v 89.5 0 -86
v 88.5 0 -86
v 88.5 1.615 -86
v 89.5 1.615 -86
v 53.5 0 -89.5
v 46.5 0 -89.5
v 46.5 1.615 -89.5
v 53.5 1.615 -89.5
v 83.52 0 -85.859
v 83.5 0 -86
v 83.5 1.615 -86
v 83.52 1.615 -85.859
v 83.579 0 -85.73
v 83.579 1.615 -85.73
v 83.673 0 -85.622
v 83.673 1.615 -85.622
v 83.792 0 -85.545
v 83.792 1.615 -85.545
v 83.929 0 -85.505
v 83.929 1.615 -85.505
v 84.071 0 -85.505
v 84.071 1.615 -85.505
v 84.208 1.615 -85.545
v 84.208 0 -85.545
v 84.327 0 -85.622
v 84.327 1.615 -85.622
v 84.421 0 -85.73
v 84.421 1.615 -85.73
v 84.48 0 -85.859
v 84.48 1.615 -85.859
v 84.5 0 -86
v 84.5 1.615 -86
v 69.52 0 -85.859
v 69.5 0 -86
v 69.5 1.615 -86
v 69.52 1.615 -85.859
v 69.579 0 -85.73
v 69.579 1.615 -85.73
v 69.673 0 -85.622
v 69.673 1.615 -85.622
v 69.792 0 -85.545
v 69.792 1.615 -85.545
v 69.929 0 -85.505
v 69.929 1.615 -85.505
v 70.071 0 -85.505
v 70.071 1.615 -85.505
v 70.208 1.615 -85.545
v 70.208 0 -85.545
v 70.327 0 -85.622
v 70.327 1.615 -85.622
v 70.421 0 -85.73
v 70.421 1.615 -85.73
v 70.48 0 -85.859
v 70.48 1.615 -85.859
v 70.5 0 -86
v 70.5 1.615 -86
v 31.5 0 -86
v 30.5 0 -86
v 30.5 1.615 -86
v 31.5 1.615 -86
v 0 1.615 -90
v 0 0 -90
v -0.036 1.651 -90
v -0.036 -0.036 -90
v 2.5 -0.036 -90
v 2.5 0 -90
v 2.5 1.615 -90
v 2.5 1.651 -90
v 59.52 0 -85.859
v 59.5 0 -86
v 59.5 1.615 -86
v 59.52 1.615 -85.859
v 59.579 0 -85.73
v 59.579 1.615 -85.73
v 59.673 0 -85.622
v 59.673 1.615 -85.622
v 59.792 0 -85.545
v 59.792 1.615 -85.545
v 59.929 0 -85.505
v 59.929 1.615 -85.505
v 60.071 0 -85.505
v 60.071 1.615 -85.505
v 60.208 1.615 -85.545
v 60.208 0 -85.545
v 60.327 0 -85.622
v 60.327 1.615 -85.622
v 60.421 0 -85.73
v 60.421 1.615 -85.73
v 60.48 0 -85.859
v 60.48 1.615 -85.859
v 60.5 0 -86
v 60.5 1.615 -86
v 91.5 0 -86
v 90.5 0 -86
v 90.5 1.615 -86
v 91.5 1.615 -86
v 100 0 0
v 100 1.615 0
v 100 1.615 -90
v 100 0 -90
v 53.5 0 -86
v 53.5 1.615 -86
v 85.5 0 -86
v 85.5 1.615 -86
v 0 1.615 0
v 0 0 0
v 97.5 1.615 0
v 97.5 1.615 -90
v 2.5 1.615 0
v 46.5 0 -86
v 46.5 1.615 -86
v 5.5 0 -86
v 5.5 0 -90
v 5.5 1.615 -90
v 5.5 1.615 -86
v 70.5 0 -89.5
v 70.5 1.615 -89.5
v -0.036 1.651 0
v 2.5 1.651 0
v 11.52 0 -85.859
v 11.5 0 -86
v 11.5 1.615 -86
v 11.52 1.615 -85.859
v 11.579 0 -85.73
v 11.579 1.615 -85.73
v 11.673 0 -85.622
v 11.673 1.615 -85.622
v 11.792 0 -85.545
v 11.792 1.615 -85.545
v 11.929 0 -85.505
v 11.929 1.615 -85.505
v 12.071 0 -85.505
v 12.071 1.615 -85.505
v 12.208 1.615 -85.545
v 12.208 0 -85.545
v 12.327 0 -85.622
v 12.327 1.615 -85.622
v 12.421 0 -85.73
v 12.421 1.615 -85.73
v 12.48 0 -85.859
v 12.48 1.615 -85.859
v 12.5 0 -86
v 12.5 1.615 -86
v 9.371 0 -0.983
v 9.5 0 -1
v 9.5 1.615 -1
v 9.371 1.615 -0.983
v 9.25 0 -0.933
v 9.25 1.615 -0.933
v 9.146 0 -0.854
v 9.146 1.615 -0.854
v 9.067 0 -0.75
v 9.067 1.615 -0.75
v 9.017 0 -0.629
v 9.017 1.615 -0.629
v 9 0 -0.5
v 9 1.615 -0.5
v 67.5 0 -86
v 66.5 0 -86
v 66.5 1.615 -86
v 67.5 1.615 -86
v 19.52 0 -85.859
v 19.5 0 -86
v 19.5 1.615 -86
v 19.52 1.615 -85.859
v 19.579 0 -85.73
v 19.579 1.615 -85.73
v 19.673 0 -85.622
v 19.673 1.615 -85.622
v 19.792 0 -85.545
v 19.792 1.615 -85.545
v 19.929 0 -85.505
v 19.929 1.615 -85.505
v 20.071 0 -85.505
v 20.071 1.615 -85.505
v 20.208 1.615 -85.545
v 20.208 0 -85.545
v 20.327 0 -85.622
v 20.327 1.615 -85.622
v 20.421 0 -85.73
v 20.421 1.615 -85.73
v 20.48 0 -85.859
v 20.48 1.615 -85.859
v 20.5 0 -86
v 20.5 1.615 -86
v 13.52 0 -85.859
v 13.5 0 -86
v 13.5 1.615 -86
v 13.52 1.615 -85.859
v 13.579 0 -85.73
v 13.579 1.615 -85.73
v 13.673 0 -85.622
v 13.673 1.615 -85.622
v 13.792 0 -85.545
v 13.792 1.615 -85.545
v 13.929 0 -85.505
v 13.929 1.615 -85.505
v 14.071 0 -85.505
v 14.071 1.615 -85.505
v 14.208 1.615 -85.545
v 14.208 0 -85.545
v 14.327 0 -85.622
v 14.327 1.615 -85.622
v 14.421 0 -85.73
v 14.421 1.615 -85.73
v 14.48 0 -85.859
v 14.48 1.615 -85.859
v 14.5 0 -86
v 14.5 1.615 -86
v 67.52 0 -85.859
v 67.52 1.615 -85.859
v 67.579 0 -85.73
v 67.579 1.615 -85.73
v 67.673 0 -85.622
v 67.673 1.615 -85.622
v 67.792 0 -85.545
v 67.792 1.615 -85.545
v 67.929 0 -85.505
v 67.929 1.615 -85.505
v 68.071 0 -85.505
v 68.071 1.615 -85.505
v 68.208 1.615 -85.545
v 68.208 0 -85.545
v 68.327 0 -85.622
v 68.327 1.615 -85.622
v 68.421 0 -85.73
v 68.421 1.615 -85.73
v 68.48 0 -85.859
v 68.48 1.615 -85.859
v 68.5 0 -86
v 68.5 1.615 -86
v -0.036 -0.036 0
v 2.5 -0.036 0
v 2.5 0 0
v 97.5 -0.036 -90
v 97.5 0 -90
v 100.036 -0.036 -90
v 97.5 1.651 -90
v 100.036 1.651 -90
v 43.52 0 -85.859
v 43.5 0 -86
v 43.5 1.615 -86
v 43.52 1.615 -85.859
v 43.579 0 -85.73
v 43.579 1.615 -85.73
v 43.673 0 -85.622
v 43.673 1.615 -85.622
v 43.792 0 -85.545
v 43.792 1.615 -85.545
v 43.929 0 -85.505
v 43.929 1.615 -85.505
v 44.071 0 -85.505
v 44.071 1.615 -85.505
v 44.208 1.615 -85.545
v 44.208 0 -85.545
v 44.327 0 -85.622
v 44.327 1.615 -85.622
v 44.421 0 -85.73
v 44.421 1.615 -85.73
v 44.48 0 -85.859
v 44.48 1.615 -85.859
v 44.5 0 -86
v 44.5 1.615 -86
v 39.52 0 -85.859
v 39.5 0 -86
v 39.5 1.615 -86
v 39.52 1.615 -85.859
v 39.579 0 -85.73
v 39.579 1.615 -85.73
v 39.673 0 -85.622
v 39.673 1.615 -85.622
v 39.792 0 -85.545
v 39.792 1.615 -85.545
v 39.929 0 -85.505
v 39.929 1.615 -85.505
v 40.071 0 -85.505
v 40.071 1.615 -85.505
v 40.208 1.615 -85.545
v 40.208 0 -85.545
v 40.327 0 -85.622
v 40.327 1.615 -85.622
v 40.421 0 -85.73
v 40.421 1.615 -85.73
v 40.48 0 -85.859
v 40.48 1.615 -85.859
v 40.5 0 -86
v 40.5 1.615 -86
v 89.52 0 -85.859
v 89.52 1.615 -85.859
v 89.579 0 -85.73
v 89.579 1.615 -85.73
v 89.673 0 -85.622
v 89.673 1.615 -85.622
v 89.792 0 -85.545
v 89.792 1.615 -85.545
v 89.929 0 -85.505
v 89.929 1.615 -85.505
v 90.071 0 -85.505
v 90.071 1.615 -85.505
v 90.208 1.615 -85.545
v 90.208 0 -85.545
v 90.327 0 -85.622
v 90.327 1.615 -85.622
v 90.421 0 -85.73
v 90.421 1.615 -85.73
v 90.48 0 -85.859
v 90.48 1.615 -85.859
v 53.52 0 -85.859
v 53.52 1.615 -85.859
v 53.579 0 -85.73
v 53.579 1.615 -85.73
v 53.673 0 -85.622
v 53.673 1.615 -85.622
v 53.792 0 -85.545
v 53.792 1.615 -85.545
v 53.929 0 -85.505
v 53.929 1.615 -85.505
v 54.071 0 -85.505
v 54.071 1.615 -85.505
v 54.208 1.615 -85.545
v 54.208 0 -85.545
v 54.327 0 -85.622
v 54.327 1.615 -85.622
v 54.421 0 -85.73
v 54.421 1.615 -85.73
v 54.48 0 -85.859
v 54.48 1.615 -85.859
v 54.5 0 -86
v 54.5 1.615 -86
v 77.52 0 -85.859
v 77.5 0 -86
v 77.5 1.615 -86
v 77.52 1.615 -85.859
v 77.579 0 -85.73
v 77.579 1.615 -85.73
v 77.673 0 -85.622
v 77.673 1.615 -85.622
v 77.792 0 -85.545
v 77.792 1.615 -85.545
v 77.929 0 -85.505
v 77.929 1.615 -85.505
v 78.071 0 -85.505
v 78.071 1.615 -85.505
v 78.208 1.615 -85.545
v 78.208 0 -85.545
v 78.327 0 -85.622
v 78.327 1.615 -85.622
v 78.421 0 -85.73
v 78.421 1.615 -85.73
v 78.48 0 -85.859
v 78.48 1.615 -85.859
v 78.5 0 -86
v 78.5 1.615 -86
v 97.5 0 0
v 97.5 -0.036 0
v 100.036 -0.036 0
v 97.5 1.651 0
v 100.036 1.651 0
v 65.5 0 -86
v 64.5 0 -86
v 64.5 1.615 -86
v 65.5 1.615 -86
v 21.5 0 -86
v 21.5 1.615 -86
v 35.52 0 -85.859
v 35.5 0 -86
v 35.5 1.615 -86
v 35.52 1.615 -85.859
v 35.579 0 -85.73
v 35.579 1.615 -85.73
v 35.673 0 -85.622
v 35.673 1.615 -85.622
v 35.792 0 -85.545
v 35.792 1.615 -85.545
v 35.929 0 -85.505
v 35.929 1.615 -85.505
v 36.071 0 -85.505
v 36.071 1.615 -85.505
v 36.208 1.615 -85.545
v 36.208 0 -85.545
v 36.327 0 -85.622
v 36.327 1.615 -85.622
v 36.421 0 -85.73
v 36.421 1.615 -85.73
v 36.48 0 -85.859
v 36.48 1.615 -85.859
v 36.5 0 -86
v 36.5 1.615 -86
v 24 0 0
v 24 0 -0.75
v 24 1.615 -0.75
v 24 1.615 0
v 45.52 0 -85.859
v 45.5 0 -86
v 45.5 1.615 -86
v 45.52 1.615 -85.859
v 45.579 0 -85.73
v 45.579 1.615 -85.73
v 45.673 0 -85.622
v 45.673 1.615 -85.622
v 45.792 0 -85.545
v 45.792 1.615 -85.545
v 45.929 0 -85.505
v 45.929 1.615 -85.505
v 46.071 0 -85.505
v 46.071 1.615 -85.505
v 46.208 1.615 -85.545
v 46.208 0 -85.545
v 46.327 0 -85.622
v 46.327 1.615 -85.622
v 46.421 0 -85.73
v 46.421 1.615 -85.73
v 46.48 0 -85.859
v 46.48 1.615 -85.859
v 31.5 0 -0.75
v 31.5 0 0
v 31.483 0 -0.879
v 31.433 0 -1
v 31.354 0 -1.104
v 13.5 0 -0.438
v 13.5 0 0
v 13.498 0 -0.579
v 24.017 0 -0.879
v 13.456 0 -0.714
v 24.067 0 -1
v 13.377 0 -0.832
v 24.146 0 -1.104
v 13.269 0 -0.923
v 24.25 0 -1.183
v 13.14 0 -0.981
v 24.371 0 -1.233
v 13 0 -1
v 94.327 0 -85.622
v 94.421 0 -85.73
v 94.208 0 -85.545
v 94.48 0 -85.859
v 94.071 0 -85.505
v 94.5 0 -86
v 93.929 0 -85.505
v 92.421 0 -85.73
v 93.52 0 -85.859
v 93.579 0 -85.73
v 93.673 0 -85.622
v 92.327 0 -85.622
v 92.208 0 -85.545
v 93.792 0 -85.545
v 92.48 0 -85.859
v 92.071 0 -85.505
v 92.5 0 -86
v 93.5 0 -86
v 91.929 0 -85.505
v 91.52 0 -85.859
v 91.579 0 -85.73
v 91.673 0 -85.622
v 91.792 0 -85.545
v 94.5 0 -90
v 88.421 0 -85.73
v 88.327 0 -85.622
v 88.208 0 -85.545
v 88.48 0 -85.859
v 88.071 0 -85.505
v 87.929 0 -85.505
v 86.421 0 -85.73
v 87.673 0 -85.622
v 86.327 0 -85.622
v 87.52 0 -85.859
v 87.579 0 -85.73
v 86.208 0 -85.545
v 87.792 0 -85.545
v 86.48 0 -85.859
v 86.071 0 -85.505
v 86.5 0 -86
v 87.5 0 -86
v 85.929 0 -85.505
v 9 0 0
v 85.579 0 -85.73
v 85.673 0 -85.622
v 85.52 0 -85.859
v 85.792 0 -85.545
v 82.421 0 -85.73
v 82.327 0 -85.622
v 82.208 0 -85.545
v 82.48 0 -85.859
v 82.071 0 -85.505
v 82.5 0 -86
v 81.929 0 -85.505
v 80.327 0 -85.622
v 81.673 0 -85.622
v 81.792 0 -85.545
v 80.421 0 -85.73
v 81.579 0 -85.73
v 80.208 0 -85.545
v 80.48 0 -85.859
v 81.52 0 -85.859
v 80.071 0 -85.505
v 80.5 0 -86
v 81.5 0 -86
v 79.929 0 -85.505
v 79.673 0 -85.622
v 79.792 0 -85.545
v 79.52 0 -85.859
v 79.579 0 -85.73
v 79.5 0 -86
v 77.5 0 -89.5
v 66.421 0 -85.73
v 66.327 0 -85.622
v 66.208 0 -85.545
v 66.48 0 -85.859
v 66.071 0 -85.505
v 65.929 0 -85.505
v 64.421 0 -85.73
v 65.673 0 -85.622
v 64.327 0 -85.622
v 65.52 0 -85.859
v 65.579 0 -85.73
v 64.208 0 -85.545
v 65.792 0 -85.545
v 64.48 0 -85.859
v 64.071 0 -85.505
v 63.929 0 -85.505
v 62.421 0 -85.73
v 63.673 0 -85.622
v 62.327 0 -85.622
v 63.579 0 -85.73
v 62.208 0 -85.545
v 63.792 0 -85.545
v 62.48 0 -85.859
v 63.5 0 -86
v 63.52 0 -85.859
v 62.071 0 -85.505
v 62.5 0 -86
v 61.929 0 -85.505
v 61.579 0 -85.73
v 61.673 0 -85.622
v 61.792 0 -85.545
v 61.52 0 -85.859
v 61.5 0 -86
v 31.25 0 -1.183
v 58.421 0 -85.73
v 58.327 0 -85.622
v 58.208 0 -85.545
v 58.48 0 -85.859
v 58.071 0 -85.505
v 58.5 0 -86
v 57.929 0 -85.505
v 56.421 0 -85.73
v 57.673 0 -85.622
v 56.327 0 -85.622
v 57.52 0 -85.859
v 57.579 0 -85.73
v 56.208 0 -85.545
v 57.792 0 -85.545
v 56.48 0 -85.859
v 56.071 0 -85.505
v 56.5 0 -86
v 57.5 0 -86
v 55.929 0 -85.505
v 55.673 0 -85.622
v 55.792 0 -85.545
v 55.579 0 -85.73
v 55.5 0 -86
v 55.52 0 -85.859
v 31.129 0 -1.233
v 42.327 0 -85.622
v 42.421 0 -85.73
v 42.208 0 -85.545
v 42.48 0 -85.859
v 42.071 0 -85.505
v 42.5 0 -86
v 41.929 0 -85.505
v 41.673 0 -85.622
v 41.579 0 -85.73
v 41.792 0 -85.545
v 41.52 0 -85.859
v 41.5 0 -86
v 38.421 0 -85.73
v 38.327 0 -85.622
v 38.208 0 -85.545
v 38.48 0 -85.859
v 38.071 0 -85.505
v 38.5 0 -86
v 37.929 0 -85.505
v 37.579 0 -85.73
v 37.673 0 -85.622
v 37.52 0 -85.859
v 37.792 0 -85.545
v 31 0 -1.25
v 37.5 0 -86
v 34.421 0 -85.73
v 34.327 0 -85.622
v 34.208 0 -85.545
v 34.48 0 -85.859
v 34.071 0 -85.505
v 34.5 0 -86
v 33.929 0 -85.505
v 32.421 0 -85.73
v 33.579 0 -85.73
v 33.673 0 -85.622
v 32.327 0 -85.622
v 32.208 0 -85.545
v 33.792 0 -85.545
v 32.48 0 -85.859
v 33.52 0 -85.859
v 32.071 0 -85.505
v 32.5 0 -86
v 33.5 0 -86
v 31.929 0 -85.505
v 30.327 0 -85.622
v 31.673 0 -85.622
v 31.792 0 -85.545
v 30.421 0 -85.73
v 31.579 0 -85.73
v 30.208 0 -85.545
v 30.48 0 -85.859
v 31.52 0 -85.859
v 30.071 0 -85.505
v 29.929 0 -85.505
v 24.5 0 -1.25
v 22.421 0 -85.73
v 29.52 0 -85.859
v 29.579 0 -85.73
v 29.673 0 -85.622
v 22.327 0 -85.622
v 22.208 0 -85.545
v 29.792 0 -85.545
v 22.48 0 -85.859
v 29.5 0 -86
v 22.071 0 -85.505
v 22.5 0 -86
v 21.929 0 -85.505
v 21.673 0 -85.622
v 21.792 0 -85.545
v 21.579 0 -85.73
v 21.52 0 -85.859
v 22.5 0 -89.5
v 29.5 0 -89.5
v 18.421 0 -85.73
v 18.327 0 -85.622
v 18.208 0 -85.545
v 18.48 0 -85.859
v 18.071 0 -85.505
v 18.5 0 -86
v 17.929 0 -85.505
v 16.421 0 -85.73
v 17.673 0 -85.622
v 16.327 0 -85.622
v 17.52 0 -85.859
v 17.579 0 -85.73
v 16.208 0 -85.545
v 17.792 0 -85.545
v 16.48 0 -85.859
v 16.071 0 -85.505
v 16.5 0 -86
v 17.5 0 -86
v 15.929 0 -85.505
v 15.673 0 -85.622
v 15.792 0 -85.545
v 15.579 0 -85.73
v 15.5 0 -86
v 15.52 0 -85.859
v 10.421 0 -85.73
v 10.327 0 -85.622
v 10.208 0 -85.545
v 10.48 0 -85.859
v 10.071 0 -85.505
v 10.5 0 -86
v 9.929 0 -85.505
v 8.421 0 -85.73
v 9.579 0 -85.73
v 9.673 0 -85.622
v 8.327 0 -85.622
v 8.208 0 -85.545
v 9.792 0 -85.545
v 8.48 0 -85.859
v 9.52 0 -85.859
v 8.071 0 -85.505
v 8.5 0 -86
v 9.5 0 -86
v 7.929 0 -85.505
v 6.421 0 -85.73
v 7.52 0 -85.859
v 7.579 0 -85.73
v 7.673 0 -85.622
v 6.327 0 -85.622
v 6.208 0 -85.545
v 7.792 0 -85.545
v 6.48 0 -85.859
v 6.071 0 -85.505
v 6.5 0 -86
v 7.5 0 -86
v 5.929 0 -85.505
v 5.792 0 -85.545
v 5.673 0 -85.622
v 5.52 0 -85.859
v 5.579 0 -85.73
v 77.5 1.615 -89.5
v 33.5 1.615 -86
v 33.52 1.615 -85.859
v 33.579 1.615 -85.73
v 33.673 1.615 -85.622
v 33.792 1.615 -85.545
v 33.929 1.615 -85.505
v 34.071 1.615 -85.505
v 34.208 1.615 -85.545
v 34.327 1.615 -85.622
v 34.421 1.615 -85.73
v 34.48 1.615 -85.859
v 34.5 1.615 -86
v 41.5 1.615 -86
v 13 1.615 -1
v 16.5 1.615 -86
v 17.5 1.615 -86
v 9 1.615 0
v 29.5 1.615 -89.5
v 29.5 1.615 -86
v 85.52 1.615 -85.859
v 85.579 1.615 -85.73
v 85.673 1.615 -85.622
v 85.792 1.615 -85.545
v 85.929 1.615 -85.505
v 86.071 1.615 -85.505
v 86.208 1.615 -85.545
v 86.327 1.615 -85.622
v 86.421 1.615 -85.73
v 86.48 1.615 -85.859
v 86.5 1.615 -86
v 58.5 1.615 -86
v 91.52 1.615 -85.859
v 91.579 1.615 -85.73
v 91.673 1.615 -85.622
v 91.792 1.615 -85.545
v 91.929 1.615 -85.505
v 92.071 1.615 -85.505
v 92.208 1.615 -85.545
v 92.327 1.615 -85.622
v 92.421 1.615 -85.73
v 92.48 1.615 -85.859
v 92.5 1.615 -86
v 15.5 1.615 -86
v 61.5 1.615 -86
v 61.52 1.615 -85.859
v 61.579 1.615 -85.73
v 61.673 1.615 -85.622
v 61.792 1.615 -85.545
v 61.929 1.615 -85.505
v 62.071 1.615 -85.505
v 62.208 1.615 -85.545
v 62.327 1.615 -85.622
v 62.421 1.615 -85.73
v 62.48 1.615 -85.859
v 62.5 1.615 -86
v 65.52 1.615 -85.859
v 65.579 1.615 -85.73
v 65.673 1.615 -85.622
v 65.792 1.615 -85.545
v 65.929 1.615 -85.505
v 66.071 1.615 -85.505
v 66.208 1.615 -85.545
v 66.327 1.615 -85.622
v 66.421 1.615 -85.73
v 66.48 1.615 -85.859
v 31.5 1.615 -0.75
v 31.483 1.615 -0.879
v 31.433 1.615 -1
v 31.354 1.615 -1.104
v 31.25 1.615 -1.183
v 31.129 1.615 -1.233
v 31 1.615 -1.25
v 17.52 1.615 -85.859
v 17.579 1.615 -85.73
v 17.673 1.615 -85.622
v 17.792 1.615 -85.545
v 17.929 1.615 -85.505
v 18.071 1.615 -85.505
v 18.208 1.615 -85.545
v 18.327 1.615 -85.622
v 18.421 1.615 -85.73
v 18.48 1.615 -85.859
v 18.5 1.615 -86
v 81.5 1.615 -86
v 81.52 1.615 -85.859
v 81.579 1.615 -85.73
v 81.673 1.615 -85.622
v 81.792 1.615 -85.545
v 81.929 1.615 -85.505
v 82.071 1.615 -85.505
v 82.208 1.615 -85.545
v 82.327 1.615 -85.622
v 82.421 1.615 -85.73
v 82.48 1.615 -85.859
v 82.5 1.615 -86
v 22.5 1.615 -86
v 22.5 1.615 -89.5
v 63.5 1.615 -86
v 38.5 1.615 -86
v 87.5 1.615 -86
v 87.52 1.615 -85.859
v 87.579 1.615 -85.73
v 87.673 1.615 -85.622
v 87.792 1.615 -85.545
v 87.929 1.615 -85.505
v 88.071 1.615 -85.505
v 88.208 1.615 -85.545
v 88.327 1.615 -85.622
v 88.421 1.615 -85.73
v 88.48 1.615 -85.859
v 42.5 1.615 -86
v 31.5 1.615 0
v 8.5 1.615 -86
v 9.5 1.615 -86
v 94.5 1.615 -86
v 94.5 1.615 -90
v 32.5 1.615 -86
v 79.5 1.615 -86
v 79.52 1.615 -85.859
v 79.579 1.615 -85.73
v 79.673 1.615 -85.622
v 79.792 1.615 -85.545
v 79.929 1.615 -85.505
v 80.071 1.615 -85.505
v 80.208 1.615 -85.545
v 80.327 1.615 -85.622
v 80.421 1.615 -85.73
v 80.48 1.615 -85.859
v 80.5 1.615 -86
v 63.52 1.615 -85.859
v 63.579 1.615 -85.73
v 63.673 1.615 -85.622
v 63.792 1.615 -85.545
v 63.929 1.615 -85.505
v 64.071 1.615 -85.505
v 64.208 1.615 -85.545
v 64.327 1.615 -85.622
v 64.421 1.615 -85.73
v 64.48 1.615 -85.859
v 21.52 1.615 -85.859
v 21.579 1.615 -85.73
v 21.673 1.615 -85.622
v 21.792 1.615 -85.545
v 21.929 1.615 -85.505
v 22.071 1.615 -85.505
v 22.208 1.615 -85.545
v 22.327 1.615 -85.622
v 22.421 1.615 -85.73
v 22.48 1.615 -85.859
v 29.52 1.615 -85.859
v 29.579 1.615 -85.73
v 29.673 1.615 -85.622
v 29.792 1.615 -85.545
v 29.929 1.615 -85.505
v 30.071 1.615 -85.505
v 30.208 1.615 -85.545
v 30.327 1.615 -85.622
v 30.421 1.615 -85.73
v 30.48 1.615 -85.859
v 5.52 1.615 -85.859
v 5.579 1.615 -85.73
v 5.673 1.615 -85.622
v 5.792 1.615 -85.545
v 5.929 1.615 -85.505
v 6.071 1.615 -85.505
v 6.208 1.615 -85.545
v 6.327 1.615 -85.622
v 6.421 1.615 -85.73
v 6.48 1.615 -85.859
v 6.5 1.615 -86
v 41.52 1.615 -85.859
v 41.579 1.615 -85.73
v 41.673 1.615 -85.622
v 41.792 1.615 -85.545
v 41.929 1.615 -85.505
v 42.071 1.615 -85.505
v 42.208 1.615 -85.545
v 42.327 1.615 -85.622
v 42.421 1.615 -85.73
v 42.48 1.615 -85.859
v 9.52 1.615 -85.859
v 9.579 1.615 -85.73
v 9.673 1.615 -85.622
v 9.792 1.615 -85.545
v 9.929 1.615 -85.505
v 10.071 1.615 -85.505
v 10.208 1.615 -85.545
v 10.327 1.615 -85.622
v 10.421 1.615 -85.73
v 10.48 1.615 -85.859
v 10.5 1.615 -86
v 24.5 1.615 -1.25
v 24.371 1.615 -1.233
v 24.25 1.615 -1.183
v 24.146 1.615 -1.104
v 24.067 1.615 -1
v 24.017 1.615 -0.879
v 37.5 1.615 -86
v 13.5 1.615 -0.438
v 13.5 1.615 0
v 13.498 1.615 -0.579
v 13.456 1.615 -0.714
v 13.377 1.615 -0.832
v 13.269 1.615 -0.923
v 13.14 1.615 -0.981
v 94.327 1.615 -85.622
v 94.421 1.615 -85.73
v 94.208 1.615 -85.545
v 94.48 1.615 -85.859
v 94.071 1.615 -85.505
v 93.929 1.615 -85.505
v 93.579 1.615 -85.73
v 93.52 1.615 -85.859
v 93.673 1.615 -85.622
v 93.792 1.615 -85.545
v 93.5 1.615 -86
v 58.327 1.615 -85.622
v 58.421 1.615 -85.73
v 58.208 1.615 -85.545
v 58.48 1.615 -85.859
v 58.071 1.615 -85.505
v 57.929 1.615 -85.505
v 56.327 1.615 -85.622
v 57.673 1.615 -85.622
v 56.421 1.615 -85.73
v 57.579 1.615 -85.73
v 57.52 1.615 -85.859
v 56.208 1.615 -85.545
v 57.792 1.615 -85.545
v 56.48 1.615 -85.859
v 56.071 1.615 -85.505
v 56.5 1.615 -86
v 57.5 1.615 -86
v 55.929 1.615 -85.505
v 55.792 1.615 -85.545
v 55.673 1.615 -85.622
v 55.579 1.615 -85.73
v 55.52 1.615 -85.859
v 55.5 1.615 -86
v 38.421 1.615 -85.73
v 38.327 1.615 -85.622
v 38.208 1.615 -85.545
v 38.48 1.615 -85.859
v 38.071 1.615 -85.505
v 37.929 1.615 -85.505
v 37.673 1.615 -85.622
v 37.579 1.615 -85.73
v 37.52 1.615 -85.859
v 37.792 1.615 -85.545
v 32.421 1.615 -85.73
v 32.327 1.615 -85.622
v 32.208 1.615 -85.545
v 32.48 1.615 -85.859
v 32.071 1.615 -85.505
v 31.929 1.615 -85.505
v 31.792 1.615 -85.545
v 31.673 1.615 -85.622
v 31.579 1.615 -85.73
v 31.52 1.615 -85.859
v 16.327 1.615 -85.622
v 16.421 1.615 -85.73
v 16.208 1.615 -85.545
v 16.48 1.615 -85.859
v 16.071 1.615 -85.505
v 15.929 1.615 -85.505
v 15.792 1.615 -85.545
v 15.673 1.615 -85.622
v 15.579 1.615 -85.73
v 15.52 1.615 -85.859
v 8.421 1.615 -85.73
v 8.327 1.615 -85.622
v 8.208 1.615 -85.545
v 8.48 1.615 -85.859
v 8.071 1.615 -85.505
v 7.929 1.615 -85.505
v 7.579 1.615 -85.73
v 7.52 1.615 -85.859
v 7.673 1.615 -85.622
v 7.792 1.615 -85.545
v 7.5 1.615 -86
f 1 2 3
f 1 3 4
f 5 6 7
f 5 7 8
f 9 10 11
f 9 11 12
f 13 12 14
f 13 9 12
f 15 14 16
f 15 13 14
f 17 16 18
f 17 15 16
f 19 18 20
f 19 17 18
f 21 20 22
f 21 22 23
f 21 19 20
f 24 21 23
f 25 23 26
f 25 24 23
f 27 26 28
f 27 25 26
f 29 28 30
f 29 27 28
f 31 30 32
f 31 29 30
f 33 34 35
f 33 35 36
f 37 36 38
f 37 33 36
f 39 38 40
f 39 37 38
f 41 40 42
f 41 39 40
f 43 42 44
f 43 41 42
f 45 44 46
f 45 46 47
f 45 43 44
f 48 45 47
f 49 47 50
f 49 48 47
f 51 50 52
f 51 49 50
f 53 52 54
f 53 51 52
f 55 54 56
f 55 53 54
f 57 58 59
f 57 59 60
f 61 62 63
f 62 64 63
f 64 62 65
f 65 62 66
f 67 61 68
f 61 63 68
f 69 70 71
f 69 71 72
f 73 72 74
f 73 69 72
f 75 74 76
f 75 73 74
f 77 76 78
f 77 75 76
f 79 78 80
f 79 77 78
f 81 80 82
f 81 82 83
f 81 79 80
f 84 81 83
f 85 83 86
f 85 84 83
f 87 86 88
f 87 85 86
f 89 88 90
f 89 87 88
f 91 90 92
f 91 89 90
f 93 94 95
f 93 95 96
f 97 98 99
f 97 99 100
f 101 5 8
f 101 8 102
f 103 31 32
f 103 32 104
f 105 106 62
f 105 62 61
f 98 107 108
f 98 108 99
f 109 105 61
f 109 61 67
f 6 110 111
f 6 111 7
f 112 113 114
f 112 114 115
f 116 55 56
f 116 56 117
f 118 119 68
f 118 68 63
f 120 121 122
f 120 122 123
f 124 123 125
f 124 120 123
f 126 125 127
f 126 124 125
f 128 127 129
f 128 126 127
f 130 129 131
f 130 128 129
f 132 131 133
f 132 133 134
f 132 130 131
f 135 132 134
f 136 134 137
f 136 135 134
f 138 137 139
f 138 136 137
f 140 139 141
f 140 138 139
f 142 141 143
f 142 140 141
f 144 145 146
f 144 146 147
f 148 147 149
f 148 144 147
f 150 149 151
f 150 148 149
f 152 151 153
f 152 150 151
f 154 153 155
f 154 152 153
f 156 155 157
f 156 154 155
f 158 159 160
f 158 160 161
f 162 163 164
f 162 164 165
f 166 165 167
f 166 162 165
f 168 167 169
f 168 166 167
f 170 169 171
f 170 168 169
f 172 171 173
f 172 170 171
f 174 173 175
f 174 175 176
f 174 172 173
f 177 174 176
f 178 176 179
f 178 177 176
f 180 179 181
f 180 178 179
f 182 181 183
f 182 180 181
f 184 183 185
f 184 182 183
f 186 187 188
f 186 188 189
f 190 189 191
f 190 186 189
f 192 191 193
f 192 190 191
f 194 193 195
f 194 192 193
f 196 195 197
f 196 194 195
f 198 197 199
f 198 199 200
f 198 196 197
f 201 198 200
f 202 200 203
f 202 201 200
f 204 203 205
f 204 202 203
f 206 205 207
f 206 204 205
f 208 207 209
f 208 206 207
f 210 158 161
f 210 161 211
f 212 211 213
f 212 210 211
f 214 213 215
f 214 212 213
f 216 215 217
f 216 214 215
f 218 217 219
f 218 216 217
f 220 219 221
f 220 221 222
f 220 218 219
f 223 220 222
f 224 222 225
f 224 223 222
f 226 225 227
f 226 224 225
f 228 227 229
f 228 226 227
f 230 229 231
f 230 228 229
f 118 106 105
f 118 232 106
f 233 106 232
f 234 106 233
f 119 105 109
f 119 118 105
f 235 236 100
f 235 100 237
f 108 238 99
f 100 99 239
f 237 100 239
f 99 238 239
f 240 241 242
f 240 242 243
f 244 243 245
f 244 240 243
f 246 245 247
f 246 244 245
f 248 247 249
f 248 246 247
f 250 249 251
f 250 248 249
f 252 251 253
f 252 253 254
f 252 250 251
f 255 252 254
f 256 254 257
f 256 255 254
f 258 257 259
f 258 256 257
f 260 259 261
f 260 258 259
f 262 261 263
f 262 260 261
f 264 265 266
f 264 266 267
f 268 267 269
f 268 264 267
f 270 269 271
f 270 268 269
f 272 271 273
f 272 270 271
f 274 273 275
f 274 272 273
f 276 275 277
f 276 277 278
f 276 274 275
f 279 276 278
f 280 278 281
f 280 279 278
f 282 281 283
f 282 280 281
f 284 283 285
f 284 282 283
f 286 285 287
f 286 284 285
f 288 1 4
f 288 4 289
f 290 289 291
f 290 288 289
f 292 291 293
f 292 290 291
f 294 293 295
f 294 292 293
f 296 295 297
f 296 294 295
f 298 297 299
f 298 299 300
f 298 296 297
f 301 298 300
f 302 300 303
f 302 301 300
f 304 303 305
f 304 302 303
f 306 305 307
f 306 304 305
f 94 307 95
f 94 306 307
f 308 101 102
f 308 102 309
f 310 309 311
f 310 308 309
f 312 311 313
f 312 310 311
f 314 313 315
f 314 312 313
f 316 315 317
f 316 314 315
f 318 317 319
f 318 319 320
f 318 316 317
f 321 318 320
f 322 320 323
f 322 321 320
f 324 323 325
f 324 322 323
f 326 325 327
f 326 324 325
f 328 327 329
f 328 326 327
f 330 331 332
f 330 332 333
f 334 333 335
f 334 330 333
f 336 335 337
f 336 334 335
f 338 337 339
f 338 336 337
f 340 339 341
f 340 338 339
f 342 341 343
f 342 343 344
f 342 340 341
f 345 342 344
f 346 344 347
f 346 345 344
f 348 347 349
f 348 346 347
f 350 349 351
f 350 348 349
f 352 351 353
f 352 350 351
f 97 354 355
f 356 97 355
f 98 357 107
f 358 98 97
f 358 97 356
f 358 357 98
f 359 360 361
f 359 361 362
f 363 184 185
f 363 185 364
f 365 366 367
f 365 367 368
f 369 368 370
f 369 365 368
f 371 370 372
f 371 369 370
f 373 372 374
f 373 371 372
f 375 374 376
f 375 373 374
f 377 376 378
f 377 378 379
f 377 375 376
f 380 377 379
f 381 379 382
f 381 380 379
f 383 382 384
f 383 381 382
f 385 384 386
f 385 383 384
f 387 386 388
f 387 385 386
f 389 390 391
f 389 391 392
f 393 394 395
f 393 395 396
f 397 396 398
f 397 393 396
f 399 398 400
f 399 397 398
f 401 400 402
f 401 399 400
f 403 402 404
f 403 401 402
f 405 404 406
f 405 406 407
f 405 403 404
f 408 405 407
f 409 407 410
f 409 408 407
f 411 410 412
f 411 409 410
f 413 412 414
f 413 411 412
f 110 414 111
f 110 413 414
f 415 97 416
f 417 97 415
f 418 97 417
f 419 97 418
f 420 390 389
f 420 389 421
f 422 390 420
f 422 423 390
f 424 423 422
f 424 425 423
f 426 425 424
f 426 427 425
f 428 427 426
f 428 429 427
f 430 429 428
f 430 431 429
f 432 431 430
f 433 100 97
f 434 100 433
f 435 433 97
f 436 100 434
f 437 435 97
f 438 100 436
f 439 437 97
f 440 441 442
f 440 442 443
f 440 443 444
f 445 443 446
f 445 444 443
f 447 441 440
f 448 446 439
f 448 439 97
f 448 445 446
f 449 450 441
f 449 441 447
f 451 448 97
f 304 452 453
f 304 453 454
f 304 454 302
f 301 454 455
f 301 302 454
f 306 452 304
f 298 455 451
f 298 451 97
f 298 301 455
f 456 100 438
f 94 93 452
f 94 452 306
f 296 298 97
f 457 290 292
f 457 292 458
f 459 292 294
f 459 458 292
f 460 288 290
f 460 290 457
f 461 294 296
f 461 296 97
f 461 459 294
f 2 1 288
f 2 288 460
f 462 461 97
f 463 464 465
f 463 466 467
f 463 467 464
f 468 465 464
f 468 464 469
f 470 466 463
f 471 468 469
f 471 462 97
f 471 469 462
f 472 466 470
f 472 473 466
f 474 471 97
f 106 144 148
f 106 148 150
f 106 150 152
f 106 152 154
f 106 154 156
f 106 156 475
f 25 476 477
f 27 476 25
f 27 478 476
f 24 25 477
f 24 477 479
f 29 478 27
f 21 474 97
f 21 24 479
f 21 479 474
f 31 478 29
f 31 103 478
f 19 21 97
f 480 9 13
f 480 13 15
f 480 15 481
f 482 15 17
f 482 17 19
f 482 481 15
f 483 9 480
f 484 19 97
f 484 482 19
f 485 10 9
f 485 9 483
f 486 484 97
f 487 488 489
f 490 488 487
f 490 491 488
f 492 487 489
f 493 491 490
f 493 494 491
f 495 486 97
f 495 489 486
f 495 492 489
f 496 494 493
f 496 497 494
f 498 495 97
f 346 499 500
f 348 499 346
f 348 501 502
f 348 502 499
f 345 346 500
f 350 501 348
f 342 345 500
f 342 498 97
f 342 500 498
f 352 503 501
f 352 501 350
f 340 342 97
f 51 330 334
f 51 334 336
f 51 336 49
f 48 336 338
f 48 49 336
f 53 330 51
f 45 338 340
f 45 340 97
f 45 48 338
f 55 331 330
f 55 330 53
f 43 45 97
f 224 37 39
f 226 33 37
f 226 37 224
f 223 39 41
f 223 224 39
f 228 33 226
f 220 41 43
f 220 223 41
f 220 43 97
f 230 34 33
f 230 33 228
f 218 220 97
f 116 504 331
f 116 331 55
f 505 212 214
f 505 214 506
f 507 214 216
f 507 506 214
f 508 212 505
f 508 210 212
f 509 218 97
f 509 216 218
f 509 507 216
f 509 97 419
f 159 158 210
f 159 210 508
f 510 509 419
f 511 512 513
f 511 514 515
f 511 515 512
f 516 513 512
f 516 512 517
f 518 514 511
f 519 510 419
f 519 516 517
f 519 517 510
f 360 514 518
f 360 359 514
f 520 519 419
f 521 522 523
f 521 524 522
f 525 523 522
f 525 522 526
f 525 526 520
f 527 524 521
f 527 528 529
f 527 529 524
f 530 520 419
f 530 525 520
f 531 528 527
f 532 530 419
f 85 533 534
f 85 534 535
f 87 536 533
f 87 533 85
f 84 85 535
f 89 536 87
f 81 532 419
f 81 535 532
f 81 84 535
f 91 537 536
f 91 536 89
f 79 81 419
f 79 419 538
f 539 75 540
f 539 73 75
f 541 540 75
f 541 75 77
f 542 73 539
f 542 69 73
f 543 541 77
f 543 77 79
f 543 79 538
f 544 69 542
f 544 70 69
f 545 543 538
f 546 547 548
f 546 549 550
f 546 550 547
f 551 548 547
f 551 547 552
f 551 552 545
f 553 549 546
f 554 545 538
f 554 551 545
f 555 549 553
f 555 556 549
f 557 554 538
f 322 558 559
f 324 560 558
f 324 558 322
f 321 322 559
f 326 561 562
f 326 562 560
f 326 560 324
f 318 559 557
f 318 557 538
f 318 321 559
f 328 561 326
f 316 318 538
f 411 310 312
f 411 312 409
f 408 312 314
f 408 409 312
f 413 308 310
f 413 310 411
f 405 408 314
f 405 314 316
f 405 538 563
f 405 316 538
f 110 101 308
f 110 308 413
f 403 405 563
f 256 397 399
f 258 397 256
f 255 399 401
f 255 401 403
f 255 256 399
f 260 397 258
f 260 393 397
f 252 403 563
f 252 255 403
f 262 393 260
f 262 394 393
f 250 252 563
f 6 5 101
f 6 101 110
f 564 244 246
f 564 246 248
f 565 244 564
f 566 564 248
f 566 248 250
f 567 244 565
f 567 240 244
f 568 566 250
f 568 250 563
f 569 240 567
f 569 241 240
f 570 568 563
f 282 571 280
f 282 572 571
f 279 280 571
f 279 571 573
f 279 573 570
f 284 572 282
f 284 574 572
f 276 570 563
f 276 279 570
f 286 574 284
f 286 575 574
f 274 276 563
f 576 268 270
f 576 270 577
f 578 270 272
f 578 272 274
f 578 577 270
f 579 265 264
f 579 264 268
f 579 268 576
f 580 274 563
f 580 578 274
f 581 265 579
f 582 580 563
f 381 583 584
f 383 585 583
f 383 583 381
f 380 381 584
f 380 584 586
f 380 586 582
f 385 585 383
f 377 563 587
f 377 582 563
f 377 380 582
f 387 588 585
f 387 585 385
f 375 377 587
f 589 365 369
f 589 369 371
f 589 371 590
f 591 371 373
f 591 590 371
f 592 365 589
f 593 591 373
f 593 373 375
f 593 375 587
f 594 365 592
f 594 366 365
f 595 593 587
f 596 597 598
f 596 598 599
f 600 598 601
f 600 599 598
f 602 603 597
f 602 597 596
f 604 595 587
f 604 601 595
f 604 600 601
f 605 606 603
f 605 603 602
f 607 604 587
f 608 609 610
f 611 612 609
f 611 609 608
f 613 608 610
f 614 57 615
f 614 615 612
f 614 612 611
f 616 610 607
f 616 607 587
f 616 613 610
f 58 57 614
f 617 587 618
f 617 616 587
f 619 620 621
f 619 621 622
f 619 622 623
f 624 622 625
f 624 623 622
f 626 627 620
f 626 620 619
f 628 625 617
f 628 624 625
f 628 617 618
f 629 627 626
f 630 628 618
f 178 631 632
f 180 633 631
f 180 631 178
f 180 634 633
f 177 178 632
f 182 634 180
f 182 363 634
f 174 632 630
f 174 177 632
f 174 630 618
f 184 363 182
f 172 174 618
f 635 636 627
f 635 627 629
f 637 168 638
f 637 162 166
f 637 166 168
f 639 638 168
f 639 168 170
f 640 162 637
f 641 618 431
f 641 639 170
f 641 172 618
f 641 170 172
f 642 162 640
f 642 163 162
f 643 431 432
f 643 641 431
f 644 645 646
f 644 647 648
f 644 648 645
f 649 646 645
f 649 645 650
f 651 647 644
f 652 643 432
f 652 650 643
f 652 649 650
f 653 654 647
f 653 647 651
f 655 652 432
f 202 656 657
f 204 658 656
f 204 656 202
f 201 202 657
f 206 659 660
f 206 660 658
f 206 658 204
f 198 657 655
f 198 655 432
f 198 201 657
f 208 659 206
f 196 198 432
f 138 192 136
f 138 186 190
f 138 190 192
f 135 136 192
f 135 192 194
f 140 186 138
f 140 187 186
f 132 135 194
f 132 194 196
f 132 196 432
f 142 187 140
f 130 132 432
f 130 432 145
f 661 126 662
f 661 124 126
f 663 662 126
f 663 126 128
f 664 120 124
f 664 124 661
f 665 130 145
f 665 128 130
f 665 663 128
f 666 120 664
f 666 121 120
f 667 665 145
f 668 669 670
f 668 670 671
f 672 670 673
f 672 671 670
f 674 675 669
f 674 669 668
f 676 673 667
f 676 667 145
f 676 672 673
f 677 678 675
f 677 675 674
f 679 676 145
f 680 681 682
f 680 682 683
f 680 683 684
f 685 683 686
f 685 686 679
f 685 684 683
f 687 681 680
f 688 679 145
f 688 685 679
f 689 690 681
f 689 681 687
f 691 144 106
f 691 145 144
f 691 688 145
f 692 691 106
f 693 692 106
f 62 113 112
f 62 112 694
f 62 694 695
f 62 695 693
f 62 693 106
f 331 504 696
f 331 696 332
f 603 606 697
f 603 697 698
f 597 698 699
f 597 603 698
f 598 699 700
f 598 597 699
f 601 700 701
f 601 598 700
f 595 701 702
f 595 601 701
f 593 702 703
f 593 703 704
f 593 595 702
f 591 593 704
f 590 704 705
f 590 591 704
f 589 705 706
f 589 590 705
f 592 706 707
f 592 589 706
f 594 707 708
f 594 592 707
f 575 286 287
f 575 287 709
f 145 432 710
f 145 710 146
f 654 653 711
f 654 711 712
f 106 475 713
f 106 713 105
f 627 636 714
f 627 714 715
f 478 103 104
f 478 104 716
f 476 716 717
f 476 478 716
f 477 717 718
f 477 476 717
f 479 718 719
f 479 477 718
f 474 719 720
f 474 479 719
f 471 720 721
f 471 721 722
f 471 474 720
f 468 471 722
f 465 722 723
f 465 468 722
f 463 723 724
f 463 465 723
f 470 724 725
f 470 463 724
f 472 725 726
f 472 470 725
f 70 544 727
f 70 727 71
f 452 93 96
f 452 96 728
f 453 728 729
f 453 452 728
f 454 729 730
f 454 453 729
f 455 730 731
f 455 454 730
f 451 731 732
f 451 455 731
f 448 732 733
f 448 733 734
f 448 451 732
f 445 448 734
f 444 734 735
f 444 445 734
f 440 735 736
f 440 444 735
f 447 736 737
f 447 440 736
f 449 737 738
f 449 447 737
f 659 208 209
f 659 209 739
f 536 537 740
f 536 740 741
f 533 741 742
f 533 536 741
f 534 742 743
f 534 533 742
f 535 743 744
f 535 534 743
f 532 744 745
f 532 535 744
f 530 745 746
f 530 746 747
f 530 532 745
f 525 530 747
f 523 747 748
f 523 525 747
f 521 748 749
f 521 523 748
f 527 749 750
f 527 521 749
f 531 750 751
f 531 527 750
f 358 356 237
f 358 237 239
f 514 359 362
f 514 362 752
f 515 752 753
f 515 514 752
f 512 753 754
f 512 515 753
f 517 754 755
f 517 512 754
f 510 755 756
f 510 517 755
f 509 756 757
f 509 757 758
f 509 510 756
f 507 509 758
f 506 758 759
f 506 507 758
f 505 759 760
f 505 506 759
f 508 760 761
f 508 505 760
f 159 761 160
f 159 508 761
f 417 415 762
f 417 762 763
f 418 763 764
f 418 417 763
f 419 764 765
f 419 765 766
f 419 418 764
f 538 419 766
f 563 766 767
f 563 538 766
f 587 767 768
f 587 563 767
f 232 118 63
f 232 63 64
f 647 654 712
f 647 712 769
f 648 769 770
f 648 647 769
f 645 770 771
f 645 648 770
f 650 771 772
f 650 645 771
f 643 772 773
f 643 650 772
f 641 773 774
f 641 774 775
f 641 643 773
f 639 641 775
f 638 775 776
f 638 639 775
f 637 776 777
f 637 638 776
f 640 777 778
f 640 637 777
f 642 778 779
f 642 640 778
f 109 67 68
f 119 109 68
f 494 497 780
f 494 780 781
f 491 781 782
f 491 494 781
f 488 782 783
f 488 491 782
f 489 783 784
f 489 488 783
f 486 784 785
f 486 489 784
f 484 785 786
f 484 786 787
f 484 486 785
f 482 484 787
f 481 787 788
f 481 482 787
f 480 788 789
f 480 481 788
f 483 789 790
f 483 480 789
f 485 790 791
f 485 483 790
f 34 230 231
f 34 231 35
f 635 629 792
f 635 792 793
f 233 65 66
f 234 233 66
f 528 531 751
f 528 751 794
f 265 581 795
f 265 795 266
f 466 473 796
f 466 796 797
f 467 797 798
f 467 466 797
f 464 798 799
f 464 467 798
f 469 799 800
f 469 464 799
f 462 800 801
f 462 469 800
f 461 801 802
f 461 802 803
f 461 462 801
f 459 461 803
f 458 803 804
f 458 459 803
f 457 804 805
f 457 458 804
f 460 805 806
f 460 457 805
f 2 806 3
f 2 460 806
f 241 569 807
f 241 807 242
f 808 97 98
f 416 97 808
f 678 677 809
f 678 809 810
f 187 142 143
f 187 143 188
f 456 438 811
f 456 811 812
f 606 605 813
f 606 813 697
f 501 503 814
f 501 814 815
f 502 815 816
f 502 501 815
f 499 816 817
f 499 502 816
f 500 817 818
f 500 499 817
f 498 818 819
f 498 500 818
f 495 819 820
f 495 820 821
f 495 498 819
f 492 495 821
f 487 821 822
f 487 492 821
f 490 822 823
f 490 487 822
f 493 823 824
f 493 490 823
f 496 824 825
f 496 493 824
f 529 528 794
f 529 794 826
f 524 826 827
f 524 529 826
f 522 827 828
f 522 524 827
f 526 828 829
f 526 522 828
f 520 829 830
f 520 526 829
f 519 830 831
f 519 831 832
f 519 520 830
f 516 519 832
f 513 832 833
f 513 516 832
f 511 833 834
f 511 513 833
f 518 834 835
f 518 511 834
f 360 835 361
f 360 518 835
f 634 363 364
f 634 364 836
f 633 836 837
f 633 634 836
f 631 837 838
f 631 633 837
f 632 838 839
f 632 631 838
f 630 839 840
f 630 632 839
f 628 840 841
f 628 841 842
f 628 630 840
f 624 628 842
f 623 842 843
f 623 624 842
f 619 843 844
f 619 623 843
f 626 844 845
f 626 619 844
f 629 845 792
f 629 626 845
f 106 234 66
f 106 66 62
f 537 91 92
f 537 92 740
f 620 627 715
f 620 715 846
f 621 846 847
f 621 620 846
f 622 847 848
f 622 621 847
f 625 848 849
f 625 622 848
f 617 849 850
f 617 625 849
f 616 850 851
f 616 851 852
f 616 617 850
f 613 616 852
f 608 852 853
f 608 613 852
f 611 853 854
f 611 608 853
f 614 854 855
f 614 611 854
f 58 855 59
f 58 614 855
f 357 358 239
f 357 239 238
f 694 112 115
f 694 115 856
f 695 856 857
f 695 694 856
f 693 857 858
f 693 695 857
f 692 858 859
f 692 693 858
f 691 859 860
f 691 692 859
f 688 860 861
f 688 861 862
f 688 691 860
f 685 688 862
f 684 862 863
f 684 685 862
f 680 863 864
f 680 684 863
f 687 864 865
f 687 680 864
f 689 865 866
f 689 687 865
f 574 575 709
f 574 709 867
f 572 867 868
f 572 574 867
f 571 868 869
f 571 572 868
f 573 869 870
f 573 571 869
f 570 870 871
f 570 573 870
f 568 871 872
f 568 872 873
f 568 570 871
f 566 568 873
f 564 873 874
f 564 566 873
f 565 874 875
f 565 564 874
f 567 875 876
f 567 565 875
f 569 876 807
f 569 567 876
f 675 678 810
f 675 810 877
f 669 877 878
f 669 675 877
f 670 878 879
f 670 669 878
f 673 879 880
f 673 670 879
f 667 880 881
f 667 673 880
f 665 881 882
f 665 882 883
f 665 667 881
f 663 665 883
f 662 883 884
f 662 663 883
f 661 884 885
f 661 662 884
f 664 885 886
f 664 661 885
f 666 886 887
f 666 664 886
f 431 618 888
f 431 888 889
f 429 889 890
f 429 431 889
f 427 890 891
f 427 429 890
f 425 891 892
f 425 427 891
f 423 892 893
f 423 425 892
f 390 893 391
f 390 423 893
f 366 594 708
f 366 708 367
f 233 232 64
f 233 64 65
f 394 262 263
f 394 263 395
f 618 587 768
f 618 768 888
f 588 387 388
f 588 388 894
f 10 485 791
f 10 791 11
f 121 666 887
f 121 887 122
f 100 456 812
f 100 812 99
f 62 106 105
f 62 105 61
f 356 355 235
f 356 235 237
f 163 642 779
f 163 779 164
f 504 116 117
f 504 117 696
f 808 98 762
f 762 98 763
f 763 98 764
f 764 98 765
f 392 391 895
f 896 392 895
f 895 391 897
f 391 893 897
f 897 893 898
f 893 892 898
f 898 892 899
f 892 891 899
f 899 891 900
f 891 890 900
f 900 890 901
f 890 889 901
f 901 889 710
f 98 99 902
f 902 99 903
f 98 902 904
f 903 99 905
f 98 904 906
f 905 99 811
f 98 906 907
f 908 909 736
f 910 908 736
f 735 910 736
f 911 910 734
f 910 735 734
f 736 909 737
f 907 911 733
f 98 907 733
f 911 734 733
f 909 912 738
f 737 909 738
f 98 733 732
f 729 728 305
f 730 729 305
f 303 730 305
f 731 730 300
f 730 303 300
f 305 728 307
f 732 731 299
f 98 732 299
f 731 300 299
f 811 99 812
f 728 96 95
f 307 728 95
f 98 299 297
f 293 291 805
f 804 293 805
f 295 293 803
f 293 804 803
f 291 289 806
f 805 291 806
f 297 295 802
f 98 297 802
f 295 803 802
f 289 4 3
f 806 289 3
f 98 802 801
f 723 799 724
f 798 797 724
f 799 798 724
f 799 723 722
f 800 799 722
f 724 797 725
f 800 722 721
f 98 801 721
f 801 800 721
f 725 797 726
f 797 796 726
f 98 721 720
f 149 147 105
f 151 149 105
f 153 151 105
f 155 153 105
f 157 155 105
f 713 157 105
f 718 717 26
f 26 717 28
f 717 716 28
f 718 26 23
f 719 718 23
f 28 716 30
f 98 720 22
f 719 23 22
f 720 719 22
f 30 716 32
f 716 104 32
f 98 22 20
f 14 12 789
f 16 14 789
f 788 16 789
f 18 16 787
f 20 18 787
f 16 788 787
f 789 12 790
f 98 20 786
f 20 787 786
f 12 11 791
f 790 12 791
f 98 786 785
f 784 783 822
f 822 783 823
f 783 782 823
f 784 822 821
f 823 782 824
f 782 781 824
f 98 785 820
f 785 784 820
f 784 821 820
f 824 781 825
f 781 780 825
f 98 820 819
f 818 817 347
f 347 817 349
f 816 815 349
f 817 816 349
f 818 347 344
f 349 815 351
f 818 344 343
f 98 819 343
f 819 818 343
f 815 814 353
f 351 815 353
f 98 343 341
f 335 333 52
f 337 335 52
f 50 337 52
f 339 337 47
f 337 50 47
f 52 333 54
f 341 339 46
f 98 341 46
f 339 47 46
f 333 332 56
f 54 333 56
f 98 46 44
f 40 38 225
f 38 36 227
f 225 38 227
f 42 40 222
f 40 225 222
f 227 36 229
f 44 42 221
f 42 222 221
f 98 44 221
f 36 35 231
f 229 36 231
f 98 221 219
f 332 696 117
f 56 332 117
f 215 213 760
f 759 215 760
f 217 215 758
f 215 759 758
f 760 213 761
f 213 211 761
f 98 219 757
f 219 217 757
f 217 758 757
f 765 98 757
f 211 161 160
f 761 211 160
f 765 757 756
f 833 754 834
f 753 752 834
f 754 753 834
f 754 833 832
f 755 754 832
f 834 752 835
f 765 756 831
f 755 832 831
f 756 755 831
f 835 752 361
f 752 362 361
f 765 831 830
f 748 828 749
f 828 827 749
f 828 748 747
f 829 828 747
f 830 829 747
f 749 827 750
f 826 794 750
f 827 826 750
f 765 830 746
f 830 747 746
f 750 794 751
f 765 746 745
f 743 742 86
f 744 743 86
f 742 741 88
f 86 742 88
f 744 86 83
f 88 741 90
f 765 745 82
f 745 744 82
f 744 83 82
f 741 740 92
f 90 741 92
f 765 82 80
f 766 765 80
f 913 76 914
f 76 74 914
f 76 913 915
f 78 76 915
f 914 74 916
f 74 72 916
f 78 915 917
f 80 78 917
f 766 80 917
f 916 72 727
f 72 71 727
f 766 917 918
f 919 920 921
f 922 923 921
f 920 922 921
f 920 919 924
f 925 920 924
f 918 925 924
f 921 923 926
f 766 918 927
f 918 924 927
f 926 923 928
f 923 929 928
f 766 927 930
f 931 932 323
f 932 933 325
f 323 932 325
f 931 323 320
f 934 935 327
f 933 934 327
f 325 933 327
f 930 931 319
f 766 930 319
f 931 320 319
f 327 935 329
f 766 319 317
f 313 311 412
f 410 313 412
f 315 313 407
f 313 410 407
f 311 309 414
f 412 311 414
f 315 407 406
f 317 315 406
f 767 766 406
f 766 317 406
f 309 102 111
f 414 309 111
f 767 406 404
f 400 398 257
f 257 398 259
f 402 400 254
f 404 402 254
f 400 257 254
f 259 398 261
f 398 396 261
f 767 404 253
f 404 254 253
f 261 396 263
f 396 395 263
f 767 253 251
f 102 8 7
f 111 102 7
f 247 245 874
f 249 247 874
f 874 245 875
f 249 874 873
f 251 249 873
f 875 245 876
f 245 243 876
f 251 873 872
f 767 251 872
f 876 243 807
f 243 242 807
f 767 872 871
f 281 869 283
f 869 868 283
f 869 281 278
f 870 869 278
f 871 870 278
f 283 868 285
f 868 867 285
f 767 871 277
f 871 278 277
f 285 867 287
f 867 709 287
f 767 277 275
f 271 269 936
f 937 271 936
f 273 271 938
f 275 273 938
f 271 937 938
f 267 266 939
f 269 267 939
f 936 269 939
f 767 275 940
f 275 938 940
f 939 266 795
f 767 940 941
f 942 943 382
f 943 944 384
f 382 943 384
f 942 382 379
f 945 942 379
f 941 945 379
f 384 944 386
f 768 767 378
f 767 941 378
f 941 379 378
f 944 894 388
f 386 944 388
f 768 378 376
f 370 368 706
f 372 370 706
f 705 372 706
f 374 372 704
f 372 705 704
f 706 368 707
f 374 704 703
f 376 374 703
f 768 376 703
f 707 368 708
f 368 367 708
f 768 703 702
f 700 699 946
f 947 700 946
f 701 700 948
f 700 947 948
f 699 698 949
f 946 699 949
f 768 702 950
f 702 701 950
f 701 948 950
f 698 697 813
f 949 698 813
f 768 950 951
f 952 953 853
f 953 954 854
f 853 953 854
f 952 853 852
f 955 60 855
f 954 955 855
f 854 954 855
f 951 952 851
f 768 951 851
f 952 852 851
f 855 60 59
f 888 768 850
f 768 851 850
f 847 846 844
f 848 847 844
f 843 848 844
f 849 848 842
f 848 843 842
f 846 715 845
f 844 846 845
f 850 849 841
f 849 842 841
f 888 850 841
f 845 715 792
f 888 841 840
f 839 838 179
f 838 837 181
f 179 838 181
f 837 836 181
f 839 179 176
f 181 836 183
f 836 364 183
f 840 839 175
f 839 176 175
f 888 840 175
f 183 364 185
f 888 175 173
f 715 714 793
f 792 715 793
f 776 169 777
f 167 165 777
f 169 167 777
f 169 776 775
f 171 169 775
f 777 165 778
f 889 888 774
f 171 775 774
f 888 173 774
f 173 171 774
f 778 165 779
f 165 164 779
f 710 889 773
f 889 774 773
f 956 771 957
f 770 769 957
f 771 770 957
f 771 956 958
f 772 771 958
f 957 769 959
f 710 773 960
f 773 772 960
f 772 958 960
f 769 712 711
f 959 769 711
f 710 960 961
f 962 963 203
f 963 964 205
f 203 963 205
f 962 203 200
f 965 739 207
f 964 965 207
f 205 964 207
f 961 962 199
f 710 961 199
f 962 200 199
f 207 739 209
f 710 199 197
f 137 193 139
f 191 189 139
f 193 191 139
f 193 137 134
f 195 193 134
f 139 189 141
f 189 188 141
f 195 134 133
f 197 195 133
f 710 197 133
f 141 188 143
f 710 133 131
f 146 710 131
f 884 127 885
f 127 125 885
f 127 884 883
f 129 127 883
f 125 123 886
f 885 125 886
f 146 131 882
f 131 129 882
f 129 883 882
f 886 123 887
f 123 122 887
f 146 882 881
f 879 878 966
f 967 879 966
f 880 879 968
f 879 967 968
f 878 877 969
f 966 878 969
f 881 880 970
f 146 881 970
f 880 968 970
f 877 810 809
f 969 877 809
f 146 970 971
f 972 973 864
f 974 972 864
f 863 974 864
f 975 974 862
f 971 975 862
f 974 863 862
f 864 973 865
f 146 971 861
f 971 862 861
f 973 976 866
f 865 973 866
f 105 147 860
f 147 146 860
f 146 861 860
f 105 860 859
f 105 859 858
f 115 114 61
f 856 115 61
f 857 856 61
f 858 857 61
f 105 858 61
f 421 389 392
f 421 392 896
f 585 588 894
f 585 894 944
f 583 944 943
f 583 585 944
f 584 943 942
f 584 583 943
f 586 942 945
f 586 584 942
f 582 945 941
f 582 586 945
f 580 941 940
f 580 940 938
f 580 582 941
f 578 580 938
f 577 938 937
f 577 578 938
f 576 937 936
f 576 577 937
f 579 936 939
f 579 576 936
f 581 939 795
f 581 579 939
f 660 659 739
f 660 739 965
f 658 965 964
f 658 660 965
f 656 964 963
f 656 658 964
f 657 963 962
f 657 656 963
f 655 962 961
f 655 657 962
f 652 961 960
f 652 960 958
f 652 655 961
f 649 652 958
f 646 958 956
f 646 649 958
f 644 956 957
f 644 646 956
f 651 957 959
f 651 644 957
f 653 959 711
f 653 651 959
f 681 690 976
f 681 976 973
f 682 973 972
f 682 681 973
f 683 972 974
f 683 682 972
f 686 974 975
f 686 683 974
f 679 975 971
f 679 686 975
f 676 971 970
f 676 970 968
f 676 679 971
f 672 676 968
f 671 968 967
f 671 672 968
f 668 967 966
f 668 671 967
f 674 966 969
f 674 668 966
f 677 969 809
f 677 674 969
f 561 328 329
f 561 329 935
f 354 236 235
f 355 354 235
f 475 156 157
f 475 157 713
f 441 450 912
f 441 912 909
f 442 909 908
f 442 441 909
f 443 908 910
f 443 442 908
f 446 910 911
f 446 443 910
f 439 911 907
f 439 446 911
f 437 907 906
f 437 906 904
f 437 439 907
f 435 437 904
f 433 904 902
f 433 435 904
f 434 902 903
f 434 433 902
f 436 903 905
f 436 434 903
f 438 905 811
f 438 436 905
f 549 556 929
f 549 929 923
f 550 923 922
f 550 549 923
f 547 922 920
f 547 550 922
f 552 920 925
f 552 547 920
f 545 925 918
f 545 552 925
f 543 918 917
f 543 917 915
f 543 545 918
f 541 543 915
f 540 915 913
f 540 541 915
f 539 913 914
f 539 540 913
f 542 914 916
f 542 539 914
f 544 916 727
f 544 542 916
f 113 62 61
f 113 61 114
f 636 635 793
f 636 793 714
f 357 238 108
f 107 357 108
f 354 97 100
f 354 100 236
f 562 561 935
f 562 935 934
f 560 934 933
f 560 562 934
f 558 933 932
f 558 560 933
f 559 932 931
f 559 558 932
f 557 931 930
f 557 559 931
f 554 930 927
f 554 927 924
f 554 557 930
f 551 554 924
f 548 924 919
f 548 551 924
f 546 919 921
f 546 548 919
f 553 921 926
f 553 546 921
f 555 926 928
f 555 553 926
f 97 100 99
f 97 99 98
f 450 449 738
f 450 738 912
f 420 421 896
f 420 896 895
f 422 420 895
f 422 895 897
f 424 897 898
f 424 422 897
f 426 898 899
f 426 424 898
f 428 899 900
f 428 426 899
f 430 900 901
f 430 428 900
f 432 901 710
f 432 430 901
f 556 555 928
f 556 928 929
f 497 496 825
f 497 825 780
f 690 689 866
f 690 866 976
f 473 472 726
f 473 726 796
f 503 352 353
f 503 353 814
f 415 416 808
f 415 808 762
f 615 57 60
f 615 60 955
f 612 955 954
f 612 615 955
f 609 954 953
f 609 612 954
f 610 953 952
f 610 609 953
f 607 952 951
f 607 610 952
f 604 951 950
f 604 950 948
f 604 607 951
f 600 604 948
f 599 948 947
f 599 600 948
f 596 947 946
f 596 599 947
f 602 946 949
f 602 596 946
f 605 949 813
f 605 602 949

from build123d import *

# Parameters (mm, degrees)
FR4_DEPTH            = 1.61544
GOLD_PLATING_DEPTH   = 90
GOLD_PLATING_2_DEPTH = 90


with BuildPart() as part:
    # Sketch1 → FR4 (new body)
    with BuildSketch(Plane(origin=(0, 0, 0), x_dir=(1, 0, 0), z_dir=(0, 1, 0))):
        with BuildLine():
            Line((0, 90), (5.5, 90))
            Line((5.5, 90), (5.5, 86))
            ThreePointArc((5.5, 86), (6, 85.5), (6.5, 86))
            Line((6.5, 86), (7.5, 86))
            ThreePointArc((7.5, 86), (8, 85.5), (8.5, 86))
            Line((8.5, 86), (9.5, 86))
            ThreePointArc((9.5, 86), (10, 85.5), (10.5, 86))
            Line((10.5, 86), (11.5, 86))
            ThreePointArc((11.5, 86), (12, 85.5), (12.5, 86))
            Line((12.5, 86), (13.5, 86))
            ThreePointArc((13.5, 86), (14, 85.5), (14.5, 86))
            Line((14.5, 86), (15.5, 86))
            ThreePointArc((15.5, 86), (16, 85.5), (16.5, 86))
            Line((16.5, 86), (17.5, 86))
            ThreePointArc((17.5, 86), (18, 85.5), (18.5, 86))
            Line((18.5, 86), (19.5, 86))
            ThreePointArc((19.5, 86), (20, 85.5), (20.5, 86))
            Line((20.5, 86), (21.5, 86))
            ThreePointArc((21.5, 86), (22, 85.5), (22.5, 86))
            Line((22.5, 86), (22.5, 89.5))
            Line((22.5, 89.5), (29.5, 89.5))
            Line((29.5, 89.5), (29.5, 86))
            ThreePointArc((29.5, 86), (30, 85.5), (30.5, 86))
            Line((30.5, 86), (31.5, 86))
            ThreePointArc((31.5, 86), (32, 85.5), (32.5, 86))
            Line((32.5, 86), (33.5, 86))
            ThreePointArc((33.5, 86), (34, 85.5), (34.5, 86))
            Line((34.5, 86), (35.5, 86))
            ThreePointArc((35.5, 86), (36, 85.5), (36.5, 86))
            Line((36.5, 86), (37.5, 86))
            ThreePointArc((37.5, 86), (38, 85.5), (38.5, 86))
            Line((38.5, 86), (39.5, 86))
            ThreePointArc((39.5, 86), (40, 85.5), (40.5, 86))
            Line((40.5, 86), (41.5, 86))
            ThreePointArc((41.5, 86), (42, 85.5), (42.5, 86))
            Line((42.5, 86), (43.5, 86))
            ThreePointArc((43.5, 86), (44, 85.5), (44.5, 86))
            Line((44.5, 86), (45.5, 86))
            ThreePointArc((45.5, 86), (46, 85.5), (46.5, 86))
            Line((46.5, 86), (46.5, 89.5))
            Line((46.5, 89.5), (53.5, 89.5))
            Line((53.5, 89.5), (53.5, 86))
            ThreePointArc((53.5, 86), (54, 85.5), (54.5, 86))
            Line((54.5, 86), (55.5, 86))
            ThreePointArc((55.5, 86), (56, 85.5), (56.5, 86))
            Line((56.5, 86), (57.5, 86))
            ThreePointArc((57.5, 86), (58, 85.5), (58.5, 86))
            Line((58.5, 86), (59.5, 86))
            ThreePointArc((59.5, 86), (60, 85.5), (60.5, 86))
            Line((60.5, 86), (61.5, 86))
            ThreePointArc((61.5, 86), (62, 85.5), (62.5, 86))
            Line((62.5, 86), (63.5, 86))
            ThreePointArc((63.5, 86), (64, 85.5), (64.5, 86))
            Line((64.5, 86), (65.5, 86))
            ThreePointArc((65.5, 86), (66, 85.5), (66.5, 86))
            Line((66.5, 86), (67.5, 86))
            ThreePointArc((67.5, 86), (68, 85.5), (68.5, 86))
            Line((68.5, 86), (69.5, 86))
            ThreePointArc((69.5, 86), (70, 85.5), (70.5, 86))
            Line((70.5, 86), (70.5, 89.5))
            Line((70.5, 89.5), (77.5, 89.5))
            Line((77.5, 89.5), (77.5, 86))
            ThreePointArc((77.5, 86), (78, 85.5), (78.5, 86))
            Line((78.5, 86), (79.5, 86))
            ThreePointArc((79.5, 86), (80, 85.5), (80.5, 86))
            Line((80.5, 86), (81.5, 86))
            ThreePointArc((81.5, 86), (82, 85.5), (82.5, 86))
            Line((82.5, 86), (83.5, 86))
            ThreePointArc((83.5, 86), (84, 85.5), (84.5, 86))
            Line((84.5, 86), (85.5, 86))
            ThreePointArc((85.5, 86), (86, 85.5), (86.5, 86))
            Line((86.5, 86), (87.5, 86))
            ThreePointArc((87.5, 86), (88, 85.5), (88.5, 86))
            Line((88.5, 86), (89.5, 86))
            ThreePointArc((89.5, 86), (90, 85.5), (90.5, 86))
            Line((90.5, 86), (91.5, 86))
            ThreePointArc((91.5, 86), (92, 85.5), (92.5, 86))
            Line((92.5, 86), (93.5, 86))
            ThreePointArc((93.5, 86), (94, 85.5), (94.5, 86))
            Line((94.5, 86), (94.5, 90))
            Line((94.5, 90), (100, 90))
            Line((100, 90), (100, 0))
            Line((100, 0), (31.5, 0))
            Line((31.5, 0), (31.5, 0.75))
            ThreePointArc((31.5, 0.75), (31.353553391, 1.103553391), (31, 1.25))
            Line((31, 1.25), (24.5, 1.25))
            ThreePointArc((24.5, 1.25), (24.146446609, 1.103553391), (24, 0.75))
            Line((24, 0.75), (24, 0))
            Line((24, 0), (13.5, 0))
            Line((13.5, 0), (13.5, 0.4375))
            ThreePointArc((13.5, 0.4375), (13.377432717, 0.832023526), (13, 1))
            Line((13, 1), (9.5, 1))
            ThreePointArc((9.5, 1), (9.146446609, 0.853553391), (9, 0.5))
            Line((9, 0.5), (9, 0))
            Line((9, 0), (0, 0))
            Line((0, 0), (0, 90))
        make_face()
    extrude(amount=FR4_DEPTH)


with BuildPart() as body_2:
    # Sketch2 → gold-plating (new body, through all)
    with BuildSketch(Plane.XY):
        Polygon((2.5, 1.61544), (2.5, 1.651), (-0.03556, 1.651), (-0.03556, -0.03556), (2.5, -0.03556), (2.5, 0), (0, 0), (0, 1.61544), align=None)
    extrude(amount=-GOLD_PLATING_DEPTH)


with BuildPart() as body_3:
    # Sketch2 → gold-plating 2 (new body, through all)
    with BuildSketch(Plane.XY):
        Polygon((100, 1.61544), (100, 0), (97.5, 0), (97.5, -0.03556), (100.03556, -0.03556), (100.03556, 1.651), (97.5, 1.651), (97.5, 1.61544), align=None)
    extrude(amount=-GOLD_PLATING_2_DEPTH)


solid = Compound([part.part, body_2.part, body_3.part])
